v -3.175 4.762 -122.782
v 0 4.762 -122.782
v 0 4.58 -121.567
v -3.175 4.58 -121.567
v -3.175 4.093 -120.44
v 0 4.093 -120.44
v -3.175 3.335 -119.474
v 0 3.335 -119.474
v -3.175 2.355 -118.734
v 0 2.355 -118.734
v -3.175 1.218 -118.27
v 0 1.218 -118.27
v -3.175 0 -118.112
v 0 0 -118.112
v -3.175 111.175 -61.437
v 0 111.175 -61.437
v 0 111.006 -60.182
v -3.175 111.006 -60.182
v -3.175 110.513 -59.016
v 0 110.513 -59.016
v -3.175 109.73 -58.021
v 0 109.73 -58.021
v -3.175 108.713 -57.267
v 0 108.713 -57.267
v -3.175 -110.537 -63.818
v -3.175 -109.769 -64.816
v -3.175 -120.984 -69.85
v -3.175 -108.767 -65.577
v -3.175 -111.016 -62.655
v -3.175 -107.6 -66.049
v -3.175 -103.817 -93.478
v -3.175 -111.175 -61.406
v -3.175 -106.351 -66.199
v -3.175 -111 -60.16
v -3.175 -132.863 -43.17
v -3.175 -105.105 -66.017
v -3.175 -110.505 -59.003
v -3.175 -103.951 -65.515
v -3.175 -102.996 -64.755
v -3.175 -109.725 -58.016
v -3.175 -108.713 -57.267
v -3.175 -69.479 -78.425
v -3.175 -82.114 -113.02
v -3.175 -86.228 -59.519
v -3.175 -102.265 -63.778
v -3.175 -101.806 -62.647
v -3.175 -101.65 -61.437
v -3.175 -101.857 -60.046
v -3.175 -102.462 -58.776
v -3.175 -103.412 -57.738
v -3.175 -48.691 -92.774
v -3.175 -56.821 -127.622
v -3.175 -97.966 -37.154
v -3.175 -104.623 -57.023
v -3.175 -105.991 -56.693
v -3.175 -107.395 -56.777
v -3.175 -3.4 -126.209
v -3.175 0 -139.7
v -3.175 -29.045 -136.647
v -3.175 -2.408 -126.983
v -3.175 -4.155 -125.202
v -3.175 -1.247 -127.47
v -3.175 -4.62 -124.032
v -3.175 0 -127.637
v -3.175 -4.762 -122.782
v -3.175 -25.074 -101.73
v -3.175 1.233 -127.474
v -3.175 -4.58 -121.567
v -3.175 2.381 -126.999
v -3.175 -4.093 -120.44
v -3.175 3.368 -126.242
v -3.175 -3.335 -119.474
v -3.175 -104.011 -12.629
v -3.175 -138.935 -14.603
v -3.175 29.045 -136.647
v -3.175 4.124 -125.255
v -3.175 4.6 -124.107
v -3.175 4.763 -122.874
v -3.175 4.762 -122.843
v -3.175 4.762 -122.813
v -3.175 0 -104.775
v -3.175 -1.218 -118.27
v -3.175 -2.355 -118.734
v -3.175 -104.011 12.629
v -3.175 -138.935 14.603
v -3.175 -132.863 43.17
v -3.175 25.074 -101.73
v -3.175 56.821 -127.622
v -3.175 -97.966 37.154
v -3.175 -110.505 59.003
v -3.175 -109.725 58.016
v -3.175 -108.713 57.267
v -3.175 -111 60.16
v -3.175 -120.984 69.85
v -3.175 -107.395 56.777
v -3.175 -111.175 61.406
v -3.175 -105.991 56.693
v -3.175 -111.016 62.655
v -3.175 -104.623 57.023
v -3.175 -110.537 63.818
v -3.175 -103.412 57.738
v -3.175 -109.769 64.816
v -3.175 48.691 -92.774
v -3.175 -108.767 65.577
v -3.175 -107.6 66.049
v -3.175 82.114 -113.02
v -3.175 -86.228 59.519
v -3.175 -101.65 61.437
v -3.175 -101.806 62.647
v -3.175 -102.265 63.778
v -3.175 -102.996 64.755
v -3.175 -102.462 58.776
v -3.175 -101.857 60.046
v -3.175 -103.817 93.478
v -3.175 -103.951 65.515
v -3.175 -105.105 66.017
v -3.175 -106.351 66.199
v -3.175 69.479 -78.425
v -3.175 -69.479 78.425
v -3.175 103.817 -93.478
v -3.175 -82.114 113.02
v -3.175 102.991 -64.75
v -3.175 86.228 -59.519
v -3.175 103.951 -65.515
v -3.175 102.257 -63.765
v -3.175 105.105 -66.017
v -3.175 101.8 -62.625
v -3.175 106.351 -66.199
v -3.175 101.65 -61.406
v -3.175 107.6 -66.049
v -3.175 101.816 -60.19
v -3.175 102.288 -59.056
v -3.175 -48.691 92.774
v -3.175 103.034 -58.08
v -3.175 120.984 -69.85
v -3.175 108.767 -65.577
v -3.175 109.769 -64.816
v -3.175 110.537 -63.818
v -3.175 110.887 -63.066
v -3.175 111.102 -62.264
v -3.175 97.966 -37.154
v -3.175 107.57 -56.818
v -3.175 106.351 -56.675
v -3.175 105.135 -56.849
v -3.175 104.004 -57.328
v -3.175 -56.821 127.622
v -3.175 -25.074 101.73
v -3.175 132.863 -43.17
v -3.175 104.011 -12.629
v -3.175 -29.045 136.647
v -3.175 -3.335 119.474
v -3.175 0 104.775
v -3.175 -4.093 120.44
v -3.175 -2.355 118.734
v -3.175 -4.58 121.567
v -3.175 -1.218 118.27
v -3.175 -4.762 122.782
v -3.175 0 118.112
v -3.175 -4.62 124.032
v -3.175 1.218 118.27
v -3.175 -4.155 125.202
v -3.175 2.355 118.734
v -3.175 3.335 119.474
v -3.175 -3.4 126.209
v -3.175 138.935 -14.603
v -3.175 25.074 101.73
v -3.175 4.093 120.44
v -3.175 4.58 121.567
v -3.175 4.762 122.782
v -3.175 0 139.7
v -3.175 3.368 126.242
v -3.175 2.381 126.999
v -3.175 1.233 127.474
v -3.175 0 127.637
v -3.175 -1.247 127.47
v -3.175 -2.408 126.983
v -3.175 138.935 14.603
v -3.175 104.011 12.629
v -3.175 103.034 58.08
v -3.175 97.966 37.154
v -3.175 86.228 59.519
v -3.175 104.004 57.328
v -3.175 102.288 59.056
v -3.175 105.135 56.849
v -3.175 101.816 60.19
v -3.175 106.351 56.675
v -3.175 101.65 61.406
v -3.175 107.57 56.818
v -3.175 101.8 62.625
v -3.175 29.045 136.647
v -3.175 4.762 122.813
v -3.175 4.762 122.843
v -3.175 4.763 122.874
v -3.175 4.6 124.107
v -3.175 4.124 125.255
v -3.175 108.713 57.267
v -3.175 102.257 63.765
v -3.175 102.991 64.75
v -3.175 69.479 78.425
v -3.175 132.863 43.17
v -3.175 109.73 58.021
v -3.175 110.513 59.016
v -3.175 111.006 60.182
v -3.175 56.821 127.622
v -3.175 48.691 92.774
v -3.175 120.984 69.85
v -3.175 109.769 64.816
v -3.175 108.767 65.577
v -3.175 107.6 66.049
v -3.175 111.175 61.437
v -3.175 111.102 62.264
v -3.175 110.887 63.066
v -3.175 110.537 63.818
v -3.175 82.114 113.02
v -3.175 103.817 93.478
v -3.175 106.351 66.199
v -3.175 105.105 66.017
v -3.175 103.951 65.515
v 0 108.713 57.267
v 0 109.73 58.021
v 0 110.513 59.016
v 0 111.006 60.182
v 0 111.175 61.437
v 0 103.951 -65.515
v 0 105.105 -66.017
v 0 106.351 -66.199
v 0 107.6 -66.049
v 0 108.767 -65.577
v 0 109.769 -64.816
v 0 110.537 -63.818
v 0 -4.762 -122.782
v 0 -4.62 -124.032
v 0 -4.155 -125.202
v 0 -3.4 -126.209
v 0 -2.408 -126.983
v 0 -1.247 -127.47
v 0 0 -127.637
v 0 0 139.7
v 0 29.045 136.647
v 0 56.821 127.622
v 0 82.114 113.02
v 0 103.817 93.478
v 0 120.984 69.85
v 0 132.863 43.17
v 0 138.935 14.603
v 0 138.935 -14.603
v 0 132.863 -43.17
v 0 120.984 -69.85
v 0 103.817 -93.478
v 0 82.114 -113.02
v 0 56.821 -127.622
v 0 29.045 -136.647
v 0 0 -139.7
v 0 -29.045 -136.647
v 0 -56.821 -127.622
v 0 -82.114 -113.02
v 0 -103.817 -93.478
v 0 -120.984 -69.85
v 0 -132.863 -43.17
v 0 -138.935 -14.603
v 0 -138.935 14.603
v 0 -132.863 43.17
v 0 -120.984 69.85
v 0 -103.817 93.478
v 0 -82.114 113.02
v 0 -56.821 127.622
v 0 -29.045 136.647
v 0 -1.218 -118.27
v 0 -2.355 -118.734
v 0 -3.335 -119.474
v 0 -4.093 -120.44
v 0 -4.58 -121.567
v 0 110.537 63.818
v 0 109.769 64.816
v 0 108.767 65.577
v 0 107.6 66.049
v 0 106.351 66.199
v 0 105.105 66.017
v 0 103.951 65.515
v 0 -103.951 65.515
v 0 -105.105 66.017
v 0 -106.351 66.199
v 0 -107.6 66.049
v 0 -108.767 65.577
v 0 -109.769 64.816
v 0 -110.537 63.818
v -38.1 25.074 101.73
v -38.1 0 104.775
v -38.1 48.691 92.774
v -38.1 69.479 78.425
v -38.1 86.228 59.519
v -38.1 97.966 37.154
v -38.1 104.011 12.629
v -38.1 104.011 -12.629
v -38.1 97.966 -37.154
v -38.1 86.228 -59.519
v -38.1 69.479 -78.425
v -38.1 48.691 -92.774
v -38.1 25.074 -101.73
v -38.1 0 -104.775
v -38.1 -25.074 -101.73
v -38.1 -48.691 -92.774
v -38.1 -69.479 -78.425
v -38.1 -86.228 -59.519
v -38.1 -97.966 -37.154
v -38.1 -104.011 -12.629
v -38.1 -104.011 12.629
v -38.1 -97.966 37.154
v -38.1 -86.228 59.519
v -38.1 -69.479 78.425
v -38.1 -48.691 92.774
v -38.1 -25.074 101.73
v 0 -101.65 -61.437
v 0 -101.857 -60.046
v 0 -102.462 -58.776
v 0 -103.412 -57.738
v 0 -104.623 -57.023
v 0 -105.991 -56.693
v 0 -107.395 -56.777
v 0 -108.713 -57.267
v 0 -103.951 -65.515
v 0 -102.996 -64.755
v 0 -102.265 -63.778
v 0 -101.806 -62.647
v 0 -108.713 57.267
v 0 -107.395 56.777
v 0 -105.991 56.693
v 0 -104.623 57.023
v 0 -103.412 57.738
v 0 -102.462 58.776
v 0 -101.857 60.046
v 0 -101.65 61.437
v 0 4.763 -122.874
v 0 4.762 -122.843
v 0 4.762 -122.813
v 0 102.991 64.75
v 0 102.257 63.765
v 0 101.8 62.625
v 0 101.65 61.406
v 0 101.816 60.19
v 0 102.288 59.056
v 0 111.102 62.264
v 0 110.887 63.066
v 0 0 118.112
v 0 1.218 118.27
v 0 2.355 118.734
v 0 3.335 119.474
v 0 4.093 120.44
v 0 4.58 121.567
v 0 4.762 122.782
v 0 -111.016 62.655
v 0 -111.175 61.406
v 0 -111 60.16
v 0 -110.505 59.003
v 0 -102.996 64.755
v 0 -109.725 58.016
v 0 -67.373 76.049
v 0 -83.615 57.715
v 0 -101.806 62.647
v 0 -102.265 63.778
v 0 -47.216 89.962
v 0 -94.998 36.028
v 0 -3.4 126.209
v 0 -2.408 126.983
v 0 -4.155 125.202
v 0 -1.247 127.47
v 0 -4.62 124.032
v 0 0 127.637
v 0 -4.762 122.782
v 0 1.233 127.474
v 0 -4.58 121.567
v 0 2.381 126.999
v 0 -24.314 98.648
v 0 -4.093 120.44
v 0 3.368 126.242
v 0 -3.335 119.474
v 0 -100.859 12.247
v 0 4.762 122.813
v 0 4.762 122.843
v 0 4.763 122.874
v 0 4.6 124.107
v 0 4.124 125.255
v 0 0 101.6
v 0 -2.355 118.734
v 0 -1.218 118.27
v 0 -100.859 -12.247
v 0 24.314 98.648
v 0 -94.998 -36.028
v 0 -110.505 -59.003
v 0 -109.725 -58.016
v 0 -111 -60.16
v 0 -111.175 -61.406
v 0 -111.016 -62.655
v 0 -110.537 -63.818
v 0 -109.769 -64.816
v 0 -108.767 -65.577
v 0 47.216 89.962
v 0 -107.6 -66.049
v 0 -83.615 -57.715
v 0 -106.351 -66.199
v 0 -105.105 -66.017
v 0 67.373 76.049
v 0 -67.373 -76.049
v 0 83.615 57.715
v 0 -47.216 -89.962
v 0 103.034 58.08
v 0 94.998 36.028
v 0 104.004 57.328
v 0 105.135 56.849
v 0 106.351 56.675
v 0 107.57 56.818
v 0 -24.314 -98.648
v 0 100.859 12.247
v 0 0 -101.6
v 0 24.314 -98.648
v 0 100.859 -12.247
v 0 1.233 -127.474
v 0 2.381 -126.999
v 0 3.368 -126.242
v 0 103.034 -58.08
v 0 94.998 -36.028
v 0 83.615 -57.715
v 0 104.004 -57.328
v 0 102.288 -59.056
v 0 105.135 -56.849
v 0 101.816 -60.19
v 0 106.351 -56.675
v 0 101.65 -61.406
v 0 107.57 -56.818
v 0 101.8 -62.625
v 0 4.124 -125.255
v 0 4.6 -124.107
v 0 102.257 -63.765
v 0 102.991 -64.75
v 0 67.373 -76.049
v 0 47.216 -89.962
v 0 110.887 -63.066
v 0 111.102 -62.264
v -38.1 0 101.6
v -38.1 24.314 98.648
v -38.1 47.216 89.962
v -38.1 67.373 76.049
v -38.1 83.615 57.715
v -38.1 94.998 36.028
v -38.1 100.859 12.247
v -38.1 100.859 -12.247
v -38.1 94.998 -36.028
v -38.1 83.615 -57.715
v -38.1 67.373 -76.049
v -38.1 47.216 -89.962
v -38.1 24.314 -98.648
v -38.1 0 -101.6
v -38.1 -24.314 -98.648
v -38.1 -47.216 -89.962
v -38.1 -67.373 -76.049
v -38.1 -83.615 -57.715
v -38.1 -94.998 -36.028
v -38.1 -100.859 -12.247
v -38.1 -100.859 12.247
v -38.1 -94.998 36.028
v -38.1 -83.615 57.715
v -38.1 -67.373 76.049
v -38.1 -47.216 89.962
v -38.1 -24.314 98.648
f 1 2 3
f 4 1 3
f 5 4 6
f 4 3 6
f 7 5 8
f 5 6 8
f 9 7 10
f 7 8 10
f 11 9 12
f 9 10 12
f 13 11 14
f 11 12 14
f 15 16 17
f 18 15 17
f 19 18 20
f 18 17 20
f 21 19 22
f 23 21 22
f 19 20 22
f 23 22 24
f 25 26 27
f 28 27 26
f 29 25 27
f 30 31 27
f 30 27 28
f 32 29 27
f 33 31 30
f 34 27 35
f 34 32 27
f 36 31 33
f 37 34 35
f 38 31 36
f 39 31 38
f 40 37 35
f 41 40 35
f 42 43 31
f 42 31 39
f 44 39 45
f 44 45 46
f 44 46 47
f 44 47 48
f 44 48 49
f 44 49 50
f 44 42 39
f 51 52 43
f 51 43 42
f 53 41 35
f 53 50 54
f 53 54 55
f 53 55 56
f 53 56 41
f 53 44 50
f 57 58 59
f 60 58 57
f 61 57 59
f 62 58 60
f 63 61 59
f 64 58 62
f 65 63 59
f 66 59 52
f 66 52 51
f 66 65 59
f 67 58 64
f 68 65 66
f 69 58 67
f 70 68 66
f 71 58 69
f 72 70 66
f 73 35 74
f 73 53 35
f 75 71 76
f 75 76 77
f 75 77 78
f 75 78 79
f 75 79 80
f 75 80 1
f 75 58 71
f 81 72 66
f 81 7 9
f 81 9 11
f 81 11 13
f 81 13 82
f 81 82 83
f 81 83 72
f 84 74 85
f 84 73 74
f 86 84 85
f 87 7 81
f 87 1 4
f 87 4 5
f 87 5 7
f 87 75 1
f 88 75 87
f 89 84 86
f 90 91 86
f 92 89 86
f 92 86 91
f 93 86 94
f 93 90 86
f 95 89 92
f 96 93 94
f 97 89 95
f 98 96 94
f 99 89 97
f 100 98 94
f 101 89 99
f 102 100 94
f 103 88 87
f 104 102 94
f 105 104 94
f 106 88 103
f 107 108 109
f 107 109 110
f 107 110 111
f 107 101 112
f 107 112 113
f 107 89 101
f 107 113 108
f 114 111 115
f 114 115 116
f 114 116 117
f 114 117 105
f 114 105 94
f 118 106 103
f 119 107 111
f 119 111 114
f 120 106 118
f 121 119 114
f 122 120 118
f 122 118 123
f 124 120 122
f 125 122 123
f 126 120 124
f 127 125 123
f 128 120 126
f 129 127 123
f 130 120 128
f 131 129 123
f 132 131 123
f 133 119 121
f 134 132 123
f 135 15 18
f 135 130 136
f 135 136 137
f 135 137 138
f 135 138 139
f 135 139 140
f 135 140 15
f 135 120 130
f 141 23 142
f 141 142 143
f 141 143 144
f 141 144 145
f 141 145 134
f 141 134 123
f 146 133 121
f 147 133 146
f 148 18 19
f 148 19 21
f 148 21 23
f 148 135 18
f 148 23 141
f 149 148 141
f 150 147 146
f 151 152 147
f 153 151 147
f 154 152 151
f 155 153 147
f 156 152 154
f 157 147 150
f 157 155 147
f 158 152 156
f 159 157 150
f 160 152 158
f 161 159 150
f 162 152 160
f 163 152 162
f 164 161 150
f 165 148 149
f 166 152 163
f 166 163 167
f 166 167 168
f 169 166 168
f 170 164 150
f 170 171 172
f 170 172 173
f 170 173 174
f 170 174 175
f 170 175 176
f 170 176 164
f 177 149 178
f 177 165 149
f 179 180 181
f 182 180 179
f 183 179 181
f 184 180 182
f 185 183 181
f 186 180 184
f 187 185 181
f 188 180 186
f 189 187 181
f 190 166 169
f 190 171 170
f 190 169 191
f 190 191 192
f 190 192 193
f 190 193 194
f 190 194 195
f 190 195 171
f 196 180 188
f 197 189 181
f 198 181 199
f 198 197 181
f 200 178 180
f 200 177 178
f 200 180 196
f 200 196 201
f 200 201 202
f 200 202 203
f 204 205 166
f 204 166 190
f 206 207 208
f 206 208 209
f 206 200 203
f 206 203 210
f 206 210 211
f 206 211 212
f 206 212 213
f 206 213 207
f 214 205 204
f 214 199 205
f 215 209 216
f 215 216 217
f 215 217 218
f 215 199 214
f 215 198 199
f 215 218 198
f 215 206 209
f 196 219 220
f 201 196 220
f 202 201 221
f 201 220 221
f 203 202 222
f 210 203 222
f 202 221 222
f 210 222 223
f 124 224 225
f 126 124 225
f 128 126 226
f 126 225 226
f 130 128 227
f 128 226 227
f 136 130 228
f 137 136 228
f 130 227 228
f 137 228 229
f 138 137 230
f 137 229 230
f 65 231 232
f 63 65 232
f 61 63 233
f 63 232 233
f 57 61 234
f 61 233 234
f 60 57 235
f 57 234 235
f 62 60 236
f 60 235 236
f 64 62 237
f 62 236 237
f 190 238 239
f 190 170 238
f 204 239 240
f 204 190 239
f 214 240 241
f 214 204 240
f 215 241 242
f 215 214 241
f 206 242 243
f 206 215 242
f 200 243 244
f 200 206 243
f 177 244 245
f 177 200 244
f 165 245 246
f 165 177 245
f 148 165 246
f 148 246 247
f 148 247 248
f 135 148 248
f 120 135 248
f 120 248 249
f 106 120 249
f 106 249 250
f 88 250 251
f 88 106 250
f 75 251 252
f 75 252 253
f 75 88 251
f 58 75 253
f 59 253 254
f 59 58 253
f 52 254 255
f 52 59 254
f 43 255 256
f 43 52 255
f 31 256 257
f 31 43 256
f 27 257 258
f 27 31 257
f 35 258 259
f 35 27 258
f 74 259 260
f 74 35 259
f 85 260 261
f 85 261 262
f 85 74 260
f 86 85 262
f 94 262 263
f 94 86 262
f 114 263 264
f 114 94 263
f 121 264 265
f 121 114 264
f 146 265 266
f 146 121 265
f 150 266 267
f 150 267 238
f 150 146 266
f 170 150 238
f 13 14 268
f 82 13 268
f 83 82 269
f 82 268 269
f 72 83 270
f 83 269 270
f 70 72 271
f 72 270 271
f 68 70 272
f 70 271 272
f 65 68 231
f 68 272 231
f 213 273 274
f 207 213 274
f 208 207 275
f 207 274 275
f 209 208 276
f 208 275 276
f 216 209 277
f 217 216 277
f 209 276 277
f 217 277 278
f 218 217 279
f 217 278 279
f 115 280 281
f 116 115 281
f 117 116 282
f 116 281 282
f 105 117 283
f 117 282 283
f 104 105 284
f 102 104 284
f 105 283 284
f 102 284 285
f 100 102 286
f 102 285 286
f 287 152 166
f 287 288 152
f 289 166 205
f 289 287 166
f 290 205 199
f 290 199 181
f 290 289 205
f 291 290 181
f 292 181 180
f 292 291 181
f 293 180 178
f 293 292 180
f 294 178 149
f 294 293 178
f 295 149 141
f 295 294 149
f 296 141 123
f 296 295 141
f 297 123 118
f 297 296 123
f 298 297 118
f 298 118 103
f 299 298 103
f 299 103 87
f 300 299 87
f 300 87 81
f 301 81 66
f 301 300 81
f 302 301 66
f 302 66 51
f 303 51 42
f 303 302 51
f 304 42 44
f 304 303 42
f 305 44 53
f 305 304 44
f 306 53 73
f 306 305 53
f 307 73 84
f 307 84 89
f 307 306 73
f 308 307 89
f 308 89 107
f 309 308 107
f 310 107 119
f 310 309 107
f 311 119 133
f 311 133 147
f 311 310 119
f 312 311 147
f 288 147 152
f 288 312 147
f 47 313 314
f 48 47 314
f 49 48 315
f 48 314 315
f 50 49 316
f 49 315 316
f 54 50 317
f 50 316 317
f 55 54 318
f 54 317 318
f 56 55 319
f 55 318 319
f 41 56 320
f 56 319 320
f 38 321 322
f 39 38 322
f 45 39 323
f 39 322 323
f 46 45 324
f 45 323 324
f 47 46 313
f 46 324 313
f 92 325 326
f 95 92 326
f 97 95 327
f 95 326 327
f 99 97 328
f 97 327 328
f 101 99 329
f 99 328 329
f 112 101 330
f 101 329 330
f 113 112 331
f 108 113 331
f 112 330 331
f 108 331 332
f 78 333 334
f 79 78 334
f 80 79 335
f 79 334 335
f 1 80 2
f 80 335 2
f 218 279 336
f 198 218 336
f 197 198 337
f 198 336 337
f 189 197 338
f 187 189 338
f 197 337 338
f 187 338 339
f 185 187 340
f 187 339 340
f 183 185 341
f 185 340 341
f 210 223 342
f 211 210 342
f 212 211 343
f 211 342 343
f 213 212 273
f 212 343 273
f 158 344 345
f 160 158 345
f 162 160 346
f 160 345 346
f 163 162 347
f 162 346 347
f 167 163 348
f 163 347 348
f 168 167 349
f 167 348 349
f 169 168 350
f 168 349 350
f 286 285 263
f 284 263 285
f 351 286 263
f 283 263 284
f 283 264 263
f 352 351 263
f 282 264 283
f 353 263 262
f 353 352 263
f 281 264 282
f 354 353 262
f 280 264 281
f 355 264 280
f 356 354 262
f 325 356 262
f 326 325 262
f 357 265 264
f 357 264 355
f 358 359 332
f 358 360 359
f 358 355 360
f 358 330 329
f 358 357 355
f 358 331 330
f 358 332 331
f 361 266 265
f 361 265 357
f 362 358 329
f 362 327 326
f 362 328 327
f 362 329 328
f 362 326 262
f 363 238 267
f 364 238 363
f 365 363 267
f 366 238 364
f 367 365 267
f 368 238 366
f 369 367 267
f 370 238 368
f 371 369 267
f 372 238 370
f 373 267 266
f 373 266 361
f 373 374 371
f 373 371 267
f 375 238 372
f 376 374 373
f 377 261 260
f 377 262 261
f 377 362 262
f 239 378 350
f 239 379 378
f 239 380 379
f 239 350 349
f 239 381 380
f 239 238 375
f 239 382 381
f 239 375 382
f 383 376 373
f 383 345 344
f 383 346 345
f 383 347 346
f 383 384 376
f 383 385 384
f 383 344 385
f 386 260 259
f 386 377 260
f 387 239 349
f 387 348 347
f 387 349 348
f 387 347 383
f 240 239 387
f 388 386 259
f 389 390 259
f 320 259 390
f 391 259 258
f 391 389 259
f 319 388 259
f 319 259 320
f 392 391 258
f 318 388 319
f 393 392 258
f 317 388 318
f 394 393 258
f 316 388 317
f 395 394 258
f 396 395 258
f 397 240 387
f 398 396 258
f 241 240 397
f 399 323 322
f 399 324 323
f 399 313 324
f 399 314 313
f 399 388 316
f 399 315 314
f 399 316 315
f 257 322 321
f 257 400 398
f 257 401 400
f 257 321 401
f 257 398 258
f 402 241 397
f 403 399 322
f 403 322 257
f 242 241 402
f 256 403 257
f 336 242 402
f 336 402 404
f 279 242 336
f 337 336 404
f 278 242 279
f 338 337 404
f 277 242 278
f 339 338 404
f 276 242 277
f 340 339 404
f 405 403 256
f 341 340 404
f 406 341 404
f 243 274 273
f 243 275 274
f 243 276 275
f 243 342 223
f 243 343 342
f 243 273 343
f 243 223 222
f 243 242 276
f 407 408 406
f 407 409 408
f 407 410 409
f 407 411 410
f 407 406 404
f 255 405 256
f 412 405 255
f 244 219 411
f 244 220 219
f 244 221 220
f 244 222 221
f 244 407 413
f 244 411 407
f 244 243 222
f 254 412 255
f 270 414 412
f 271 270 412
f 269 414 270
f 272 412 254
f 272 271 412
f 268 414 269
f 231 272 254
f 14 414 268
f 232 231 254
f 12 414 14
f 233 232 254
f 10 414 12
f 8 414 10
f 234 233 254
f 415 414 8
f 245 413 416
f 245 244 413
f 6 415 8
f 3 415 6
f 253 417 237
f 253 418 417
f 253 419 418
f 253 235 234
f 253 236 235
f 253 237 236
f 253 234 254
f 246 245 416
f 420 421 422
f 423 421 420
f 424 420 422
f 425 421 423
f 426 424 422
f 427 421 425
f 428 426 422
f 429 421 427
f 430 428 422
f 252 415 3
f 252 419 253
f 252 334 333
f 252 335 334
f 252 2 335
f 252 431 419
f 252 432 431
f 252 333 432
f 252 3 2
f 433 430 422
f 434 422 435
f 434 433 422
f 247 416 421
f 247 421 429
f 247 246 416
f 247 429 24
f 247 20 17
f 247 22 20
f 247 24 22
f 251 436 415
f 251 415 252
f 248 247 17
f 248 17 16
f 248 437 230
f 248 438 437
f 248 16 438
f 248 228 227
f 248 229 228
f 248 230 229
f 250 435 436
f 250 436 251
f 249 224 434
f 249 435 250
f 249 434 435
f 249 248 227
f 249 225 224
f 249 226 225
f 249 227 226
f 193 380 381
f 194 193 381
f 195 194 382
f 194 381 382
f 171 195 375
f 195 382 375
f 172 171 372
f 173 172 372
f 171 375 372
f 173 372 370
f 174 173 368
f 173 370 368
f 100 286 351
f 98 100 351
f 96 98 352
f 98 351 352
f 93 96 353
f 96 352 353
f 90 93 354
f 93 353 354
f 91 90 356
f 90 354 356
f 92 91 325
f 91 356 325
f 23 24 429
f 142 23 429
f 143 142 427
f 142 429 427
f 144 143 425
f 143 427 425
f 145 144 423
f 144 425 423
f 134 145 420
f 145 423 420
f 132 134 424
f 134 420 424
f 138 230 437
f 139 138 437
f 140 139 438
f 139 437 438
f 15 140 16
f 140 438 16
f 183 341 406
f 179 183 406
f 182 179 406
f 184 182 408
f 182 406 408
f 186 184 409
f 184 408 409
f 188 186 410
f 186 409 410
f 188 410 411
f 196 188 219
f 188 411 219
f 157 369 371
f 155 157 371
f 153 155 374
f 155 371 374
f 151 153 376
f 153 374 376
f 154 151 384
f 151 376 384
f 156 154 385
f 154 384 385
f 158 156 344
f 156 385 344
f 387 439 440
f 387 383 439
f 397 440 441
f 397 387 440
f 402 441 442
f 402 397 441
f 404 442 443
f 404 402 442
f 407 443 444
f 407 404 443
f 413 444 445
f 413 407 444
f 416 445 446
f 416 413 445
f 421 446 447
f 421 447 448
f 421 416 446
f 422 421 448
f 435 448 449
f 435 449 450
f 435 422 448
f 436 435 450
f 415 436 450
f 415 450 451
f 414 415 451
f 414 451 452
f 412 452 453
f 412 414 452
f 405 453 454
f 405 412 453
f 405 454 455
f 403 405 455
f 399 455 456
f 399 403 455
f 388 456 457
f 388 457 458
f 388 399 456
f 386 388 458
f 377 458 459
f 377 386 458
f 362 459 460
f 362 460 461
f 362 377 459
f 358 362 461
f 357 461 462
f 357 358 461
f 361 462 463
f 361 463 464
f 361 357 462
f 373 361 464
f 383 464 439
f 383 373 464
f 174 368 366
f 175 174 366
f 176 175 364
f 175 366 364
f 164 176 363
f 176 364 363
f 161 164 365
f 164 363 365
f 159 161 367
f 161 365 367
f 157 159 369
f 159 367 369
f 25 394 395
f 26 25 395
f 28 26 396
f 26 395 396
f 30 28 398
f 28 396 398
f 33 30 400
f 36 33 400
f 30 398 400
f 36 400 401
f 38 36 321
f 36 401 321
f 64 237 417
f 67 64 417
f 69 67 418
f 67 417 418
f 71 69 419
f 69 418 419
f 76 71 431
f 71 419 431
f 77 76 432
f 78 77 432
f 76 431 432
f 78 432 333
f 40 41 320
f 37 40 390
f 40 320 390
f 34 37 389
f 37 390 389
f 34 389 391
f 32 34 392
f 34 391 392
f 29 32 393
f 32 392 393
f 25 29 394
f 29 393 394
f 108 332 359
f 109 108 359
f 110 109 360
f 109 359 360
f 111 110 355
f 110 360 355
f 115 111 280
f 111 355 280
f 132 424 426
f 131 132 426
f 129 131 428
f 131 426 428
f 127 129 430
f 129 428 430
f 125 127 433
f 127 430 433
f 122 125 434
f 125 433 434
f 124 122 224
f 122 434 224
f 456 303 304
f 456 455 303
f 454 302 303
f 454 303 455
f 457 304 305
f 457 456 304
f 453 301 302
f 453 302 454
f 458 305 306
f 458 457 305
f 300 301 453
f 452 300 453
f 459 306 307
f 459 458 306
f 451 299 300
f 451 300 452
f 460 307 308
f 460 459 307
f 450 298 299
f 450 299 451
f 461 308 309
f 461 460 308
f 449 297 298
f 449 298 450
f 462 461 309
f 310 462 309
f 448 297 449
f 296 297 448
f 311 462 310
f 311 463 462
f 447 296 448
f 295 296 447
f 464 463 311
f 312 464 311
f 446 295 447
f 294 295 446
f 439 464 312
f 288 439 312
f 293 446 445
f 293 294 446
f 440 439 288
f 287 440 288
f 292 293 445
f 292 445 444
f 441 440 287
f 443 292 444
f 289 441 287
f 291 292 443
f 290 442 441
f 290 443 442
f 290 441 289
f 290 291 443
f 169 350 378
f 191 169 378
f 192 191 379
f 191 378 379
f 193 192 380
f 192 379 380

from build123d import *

# Parameters (mm, degrees)
F3_DEPTH = 25.4


with BuildPart() as f1:
    # F0 (on Front) → F1 (revolve)
    with BuildSketch(Plane.XZ):
        Polygon((-38.1, 101.6), (0, 101.6), (0, 139.7), (-3.175, 139.7), (-3.175, 104.775), (-38.1, 104.775), align=None)
    revolve(axis=Axis((-40.6781, 0, 0), (-1, 0, 0)))

    # F2 (on Right) → F3 (cut)
    with BuildSketch(Plane.YZ):
        with BuildLine():
            Line((-110.5365962259, 63.8183335863), (-106.4121502404, 61.4370835863))
            ThreePointArc((-106.4121502404, 61.4370835863), (-105.201540854, 63.4877685883), (-103.951417404, 65.5146073641))
            ThreePointArc((-103.951417404, 65.5146073641), (-107.6001407887, 66.0490337928), (-110.5365962259, 63.8183335863))
        make_face()
        with BuildLine():
            ThreePointArc((-108.7130229983, 57.2672645493), (-107.582790854, 59.3633226027), (-106.4121502404, 61.4370835863))
            Line((-106.4121502404, 61.4370835863), (-110.5365962259, 63.8183335863))
            ThreePointArc((-110.5365962259, 63.8183335863), (-111.0002115544, 60.1599384774), (-108.7130229983, 57.2672645493))
        make_face()
        with BuildLine():
            ThreePointArc((-108.7130229983, 57.2672645493), (-105.1350051315, 56.8490222724), (-102.2877042549, 59.0558335863))
            Line((-102.2877042549, 59.0558335863), (-106.4121502404, 61.4370835863))
            ThreePointArc((-106.4121502404, 61.4370835863), (-107.582790854, 59.3633226027), (-108.7130229983, 57.2672645493))
        make_face()
        with BuildLine():
            Line((-106.4121502404, 61.4370835863), (-102.2877042549, 59.0558335863))
            ThreePointArc((-102.2877042549, 59.0558335863), (-101.8119284927, 60.204457884), (-101.6496502404, 61.4370835863))
            ThreePointArc((-101.6496502404, 61.4370835863), (-102.2648230057, 63.7782548869), (-103.951417404, 65.5146073641))
            ThreePointArc((-103.951417404, 65.5146073641), (-105.201540854, 63.4877685883), (-106.4121502404, 61.4370835863))
        make_face()
        with BuildLine():
            Line((-110.5365962259, -63.8183335863), (-106.4121502404, -61.4370835863))
            ThreePointArc((-106.4121502404, -61.4370835863), (-107.582790854, -59.3633226027), (-108.7130229983, -57.2672645493))
            ThreePointArc((-108.7130229983, -57.2672645493), (-111.0002115544, -60.1599384774), (-110.5365962259, -63.8183335863))
        make_face()
        with BuildLine():
            Line((-106.4121502404, -61.4370835863), (-102.2877042549, -59.0558335863))
            ThreePointArc((-102.2877042549, -59.0558335863), (-105.1350051315, -56.8490222724), (-108.7130229983, -57.2672645493))
            ThreePointArc((-108.7130229983, -57.2672645493), (-107.582790854, -59.3633226027), (-106.4121502404, -61.4370835863))
        make_face()
        with BuildLine():
            ThreePointArc((-101.6496502404, -61.4370835863), (-101.8119284927, -60.204457884), (-102.2877042549, -59.0558335863))
            Line((-102.2877042549, -59.0558335863), (-106.4121502404, -61.4370835863))
            ThreePointArc((-106.4121502404, -61.4370835863), (-105.201540854, -63.4877685883), (-103.951417404, -65.5146073641))
            ThreePointArc((-103.951417404, -65.5146073641), (-102.2648230057, -63.7782548869), (-101.6496502404, -61.4370835863))
        make_face()
        with BuildLine():
            ThreePointArc((-103.951417404, -65.5146073641), (-105.201540854, -63.4877685883), (-106.4121502404, -61.4370835863))
            Line((-106.4121502404, -61.4370835863), (-110.5365962259, -63.8183335863))
            ThreePointArc((-110.5365962259, -63.8183335863), (-107.6001407887, -66.0490337928), (-103.951417404, -65.5146073641))
        make_face()
        with BuildLine():
            ThreePointArc((4.7625, -122.8741671727), (4.7622763933, -122.8280173762), (4.7616055942, -122.7818719133))
            ThreePointArc((4.7616055942, -122.7818719133), (2.38125, -122.851091191), (0, -122.8741671727))
            Line((0, -122.8741671727), (0, -127.6366671727))
            ThreePointArc((0, -127.6366671727), (3.3675960454, -126.2417632181), (4.7625, -122.8741671727))
        make_face()
        with BuildLine():
            ThreePointArc((4.7616055942, -122.7818719133), (3.3348050976, -119.474096407), (0, -118.1116671727))
            Line((0, -118.1116671727), (0, -122.8741671727))
            ThreePointArc((0, -122.8741671727), (2.38125, -122.851091191), (4.7616055942, -122.7818719133))
        make_face()
        with BuildLine():
            Line((0, -122.8741671727), (0, -118.1116671727))
            ThreePointArc((0, -118.1116671727), (-3.3348050976, -119.474096407), (-4.7616055942, -122.7818719133))
            ThreePointArc((-4.7616055942, -122.7818719133), (-2.38125, -122.851091191), (0, -122.8741671727))
        make_face()
        with BuildLine():
            Line((0, -127.6366671727), (0, -122.8741671727))
            ThreePointArc((0, -122.8741671727), (-2.38125, -122.851091191), (-4.7616055942, -122.7818719133))
            ThreePointArc((-4.7616055942, -122.7818719133), (-3.4000707656, -126.2089722702), (0, -127.6366671727))
        make_face()
        with BuildLine():
            ThreePointArc((106.4121502404, -61.4370835863), (107.582790854, -59.3633226027), (108.7130229983, -57.2672645493))
            ThreePointArc((108.7130229983, -57.2672645493), (105.1350051315, -56.8490222724), (102.2877042549, -59.0558335863))
            Line((102.2877042549, -59.0558335863), (106.4121502404, -61.4370835863))
        make_face()
        with BuildLine():
            ThreePointArc((111.1746502404, -61.4370835863), (110.5133276786, -59.0159784936), (108.7130229983, -57.2672645493))
            ThreePointArc((108.7130229983, -57.2672645493), (107.582790854, -59.3633226027), (106.4121502404, -61.4370835863))
            Line((106.4121502404, -61.4370835863), (110.5365962259, -63.8183335863))
            ThreePointArc((110.5365962259, -63.8183335863), (111.0123719881, -62.6697092886), (111.1746502404, -61.4370835863))
        make_face()
        with BuildLine():
            Line((110.5365962259, -63.8183335863), (106.4121502404, -61.4370835863))
            ThreePointArc((106.4121502404, -61.4370835863), (105.201540854, -63.4877685883), (103.951417404, -65.5146073641))
            ThreePointArc((103.951417404, -65.5146073641), (107.6001407887, -66.0490337928), (110.5365962259, -63.8183335863))
        make_face()
        with BuildLine():
            ThreePointArc((103.951417404, -65.5146073641), (105.201540854, -63.4877685883), (106.4121502404, -61.4370835863))
            Line((106.4121502404, -61.4370835863), (102.2877042549, -59.0558335863))
            ThreePointArc((102.2877042549, -59.0558335863), (101.8002000339, -62.6250741347), (103.951417404, -65.5146073641))
        make_face()
        with BuildLine():
            ThreePointArc((103.951417404, 65.5146073641), (105.201540854, 63.4877685883), (106.4121502404, 61.4370835863))
            Line((106.4121502404, 61.4370835863), (110.5365962259, 63.8183335863))
            ThreePointArc((110.5365962259, 63.8183335863), (107.6001407887, 66.0490337928), (103.951417404, 65.5146073641))
        make_face()
        with BuildLine():
            ThreePointArc((106.4121502404, 61.4370835863), (107.582790854, 59.3633226027), (108.7130229983, 57.2672645493))
            ThreePointArc((108.7130229983, 57.2672645493), (110.5133276786, 59.0159784936), (111.1746502404, 61.4370835863))
            ThreePointArc((111.1746502404, 61.4370835863), (111.0123719881, 62.6697092886), (110.5365962259, 63.8183335863))
            Line((110.5365962259, 63.8183335863), (106.4121502404, 61.4370835863))
        make_face()
        with BuildLine():
            ThreePointArc((102.2877042549, 59.0558335863), (105.1350051315, 56.8490222724), (108.7130229983, 57.2672645493))
            ThreePointArc((108.7130229983, 57.2672645493), (107.582790854, 59.3633226027), (106.4121502404, 61.4370835863))
            Line((106.4121502404, 61.4370835863), (102.2877042549, 59.0558335863))
        make_face()
        with BuildLine():
            Line((102.2877042549, 59.0558335863), (106.4121502404, 61.4370835863))
            ThreePointArc((106.4121502404, 61.4370835863), (105.201540854, 63.4877685883), (103.951417404, 65.5146073641))
            ThreePointArc((103.951417404, 65.5146073641), (101.8002000339, 62.6250741347), (102.2877042549, 59.0558335863))
        make_face()
        with BuildLine():
            ThreePointArc((0, 122.8741671727), (2.38125, 122.851091191), (4.7616055942, 122.7818719133))
            ThreePointArc((4.7616055942, 122.7818719133), (4.7622763933, 122.8280173762), (4.7625, 122.8741671727))
            ThreePointArc((4.7625, 122.8741671727), (3.3675960454, 126.2417632181), (0, 127.6366671727))
            Line((0, 127.6366671727), (0, 122.8741671727))
        make_face()
        with BuildLine():
            ThreePointArc((-4.7616055942, 122.7818719133), (-2.38125, 122.851091191), (0, 122.8741671727))
            Line((0, 122.8741671727), (0, 127.6366671727))
            ThreePointArc((0, 127.6366671727), (-3.4000707656, 126.2089722702), (-4.7616055942, 122.7818719133))
        make_face()
        with BuildLine():
            ThreePointArc((-4.7616055942, 122.7818719133), (-3.3348050976, 119.474096407), (0, 118.1116671727))
            Line((0, 118.1116671727), (0, 122.8741671727))
            ThreePointArc((0, 122.8741671727), (-2.38125, 122.851091191), (-4.7616055942, 122.7818719133))
        make_face()
        with BuildLine():
            ThreePointArc((0, 118.1116671727), (3.3348050976, 119.474096407), (4.7616055942, 122.7818719133))
            ThreePointArc((4.7616055942, 122.7818719133), (2.38125, 122.851091191), (0, 122.8741671727))
            Line((0, 122.8741671727), (0, 118.1116671727))
        make_face()
    extrude(amount=-F3_DEPTH, mode=Mode.SUBTRACT)


solid = f1.part
